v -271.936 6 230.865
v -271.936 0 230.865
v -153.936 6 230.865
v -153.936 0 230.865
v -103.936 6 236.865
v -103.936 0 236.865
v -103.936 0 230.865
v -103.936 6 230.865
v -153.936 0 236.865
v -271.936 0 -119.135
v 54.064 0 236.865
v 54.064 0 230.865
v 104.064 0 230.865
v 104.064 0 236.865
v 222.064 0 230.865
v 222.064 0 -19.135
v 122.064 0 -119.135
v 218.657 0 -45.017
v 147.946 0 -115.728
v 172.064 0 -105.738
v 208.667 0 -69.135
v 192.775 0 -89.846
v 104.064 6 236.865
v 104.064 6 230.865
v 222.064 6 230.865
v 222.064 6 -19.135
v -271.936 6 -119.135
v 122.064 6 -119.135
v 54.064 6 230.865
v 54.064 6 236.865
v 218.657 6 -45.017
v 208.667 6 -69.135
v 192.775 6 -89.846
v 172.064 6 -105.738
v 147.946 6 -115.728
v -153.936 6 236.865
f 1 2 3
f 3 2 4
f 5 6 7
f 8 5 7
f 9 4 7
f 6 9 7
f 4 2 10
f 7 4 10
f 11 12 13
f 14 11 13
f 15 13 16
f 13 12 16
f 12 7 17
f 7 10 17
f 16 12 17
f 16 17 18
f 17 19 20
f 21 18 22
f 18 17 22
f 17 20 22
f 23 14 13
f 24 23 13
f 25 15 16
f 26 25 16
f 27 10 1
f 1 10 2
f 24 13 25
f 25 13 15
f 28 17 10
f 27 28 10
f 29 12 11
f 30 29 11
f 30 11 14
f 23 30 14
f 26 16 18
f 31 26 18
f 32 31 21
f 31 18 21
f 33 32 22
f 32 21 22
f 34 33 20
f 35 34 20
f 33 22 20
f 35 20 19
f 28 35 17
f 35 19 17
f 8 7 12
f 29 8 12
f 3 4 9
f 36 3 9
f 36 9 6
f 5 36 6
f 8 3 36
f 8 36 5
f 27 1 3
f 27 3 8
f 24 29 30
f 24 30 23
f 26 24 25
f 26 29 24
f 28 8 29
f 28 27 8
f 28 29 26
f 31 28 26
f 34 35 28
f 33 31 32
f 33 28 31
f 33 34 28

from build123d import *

# Parameters (mm, degrees)
BOSS_EXTRUDE1_DEPTH = 6


with BuildPart() as part:
    # Sketch1 → Boss-Extrude1 (new body)
    with BuildSketch(Plane(origin=(0, 0, 0), x_dir=(1, 0, 0), z_dir=(0, 1, 0))):
        with BuildLine():
            Line((54.064062015, -230.864850181), (54.064062015, -236.864850181))
            Line((54.064062015, -236.864850181), (104.064062015, -236.864850181))
            Line((104.064062015, -236.864850181), (104.064062015, -230.864850181))
            Line((104.064062015, -230.864850181), (222.064062015, -230.864850181))
            Line((222.064062015, -230.864850181), (222.064062015, 19.135149819))
            ThreePointArc((222.064062015, 19.135149819), (192.774740133, 89.845827938), (122.064062015, 119.135149819))
            Line((122.064062015, 119.135149819), (-271.935937985, 119.135149819))
            Line((-271.935937985, 119.135149819), (-271.935937985, -230.864850181))
            Line((-271.935937985, -230.864850181), (-153.935937985, -230.864850181))
            Line((-153.935937985, -230.864850181), (-153.935937985, -236.864850181))
            Line((-153.935937985, -236.864850181), (-103.935937985, -236.864850181))
            Line((-103.935937985, -236.864850181), (-103.935937985, -230.864850181))
            Line((-103.935937985, -230.864850181), (54.064062015, -230.864850181))
        make_face()
    extrude(amount=BOSS_EXTRUDE1_DEPTH)


solid = part.part
